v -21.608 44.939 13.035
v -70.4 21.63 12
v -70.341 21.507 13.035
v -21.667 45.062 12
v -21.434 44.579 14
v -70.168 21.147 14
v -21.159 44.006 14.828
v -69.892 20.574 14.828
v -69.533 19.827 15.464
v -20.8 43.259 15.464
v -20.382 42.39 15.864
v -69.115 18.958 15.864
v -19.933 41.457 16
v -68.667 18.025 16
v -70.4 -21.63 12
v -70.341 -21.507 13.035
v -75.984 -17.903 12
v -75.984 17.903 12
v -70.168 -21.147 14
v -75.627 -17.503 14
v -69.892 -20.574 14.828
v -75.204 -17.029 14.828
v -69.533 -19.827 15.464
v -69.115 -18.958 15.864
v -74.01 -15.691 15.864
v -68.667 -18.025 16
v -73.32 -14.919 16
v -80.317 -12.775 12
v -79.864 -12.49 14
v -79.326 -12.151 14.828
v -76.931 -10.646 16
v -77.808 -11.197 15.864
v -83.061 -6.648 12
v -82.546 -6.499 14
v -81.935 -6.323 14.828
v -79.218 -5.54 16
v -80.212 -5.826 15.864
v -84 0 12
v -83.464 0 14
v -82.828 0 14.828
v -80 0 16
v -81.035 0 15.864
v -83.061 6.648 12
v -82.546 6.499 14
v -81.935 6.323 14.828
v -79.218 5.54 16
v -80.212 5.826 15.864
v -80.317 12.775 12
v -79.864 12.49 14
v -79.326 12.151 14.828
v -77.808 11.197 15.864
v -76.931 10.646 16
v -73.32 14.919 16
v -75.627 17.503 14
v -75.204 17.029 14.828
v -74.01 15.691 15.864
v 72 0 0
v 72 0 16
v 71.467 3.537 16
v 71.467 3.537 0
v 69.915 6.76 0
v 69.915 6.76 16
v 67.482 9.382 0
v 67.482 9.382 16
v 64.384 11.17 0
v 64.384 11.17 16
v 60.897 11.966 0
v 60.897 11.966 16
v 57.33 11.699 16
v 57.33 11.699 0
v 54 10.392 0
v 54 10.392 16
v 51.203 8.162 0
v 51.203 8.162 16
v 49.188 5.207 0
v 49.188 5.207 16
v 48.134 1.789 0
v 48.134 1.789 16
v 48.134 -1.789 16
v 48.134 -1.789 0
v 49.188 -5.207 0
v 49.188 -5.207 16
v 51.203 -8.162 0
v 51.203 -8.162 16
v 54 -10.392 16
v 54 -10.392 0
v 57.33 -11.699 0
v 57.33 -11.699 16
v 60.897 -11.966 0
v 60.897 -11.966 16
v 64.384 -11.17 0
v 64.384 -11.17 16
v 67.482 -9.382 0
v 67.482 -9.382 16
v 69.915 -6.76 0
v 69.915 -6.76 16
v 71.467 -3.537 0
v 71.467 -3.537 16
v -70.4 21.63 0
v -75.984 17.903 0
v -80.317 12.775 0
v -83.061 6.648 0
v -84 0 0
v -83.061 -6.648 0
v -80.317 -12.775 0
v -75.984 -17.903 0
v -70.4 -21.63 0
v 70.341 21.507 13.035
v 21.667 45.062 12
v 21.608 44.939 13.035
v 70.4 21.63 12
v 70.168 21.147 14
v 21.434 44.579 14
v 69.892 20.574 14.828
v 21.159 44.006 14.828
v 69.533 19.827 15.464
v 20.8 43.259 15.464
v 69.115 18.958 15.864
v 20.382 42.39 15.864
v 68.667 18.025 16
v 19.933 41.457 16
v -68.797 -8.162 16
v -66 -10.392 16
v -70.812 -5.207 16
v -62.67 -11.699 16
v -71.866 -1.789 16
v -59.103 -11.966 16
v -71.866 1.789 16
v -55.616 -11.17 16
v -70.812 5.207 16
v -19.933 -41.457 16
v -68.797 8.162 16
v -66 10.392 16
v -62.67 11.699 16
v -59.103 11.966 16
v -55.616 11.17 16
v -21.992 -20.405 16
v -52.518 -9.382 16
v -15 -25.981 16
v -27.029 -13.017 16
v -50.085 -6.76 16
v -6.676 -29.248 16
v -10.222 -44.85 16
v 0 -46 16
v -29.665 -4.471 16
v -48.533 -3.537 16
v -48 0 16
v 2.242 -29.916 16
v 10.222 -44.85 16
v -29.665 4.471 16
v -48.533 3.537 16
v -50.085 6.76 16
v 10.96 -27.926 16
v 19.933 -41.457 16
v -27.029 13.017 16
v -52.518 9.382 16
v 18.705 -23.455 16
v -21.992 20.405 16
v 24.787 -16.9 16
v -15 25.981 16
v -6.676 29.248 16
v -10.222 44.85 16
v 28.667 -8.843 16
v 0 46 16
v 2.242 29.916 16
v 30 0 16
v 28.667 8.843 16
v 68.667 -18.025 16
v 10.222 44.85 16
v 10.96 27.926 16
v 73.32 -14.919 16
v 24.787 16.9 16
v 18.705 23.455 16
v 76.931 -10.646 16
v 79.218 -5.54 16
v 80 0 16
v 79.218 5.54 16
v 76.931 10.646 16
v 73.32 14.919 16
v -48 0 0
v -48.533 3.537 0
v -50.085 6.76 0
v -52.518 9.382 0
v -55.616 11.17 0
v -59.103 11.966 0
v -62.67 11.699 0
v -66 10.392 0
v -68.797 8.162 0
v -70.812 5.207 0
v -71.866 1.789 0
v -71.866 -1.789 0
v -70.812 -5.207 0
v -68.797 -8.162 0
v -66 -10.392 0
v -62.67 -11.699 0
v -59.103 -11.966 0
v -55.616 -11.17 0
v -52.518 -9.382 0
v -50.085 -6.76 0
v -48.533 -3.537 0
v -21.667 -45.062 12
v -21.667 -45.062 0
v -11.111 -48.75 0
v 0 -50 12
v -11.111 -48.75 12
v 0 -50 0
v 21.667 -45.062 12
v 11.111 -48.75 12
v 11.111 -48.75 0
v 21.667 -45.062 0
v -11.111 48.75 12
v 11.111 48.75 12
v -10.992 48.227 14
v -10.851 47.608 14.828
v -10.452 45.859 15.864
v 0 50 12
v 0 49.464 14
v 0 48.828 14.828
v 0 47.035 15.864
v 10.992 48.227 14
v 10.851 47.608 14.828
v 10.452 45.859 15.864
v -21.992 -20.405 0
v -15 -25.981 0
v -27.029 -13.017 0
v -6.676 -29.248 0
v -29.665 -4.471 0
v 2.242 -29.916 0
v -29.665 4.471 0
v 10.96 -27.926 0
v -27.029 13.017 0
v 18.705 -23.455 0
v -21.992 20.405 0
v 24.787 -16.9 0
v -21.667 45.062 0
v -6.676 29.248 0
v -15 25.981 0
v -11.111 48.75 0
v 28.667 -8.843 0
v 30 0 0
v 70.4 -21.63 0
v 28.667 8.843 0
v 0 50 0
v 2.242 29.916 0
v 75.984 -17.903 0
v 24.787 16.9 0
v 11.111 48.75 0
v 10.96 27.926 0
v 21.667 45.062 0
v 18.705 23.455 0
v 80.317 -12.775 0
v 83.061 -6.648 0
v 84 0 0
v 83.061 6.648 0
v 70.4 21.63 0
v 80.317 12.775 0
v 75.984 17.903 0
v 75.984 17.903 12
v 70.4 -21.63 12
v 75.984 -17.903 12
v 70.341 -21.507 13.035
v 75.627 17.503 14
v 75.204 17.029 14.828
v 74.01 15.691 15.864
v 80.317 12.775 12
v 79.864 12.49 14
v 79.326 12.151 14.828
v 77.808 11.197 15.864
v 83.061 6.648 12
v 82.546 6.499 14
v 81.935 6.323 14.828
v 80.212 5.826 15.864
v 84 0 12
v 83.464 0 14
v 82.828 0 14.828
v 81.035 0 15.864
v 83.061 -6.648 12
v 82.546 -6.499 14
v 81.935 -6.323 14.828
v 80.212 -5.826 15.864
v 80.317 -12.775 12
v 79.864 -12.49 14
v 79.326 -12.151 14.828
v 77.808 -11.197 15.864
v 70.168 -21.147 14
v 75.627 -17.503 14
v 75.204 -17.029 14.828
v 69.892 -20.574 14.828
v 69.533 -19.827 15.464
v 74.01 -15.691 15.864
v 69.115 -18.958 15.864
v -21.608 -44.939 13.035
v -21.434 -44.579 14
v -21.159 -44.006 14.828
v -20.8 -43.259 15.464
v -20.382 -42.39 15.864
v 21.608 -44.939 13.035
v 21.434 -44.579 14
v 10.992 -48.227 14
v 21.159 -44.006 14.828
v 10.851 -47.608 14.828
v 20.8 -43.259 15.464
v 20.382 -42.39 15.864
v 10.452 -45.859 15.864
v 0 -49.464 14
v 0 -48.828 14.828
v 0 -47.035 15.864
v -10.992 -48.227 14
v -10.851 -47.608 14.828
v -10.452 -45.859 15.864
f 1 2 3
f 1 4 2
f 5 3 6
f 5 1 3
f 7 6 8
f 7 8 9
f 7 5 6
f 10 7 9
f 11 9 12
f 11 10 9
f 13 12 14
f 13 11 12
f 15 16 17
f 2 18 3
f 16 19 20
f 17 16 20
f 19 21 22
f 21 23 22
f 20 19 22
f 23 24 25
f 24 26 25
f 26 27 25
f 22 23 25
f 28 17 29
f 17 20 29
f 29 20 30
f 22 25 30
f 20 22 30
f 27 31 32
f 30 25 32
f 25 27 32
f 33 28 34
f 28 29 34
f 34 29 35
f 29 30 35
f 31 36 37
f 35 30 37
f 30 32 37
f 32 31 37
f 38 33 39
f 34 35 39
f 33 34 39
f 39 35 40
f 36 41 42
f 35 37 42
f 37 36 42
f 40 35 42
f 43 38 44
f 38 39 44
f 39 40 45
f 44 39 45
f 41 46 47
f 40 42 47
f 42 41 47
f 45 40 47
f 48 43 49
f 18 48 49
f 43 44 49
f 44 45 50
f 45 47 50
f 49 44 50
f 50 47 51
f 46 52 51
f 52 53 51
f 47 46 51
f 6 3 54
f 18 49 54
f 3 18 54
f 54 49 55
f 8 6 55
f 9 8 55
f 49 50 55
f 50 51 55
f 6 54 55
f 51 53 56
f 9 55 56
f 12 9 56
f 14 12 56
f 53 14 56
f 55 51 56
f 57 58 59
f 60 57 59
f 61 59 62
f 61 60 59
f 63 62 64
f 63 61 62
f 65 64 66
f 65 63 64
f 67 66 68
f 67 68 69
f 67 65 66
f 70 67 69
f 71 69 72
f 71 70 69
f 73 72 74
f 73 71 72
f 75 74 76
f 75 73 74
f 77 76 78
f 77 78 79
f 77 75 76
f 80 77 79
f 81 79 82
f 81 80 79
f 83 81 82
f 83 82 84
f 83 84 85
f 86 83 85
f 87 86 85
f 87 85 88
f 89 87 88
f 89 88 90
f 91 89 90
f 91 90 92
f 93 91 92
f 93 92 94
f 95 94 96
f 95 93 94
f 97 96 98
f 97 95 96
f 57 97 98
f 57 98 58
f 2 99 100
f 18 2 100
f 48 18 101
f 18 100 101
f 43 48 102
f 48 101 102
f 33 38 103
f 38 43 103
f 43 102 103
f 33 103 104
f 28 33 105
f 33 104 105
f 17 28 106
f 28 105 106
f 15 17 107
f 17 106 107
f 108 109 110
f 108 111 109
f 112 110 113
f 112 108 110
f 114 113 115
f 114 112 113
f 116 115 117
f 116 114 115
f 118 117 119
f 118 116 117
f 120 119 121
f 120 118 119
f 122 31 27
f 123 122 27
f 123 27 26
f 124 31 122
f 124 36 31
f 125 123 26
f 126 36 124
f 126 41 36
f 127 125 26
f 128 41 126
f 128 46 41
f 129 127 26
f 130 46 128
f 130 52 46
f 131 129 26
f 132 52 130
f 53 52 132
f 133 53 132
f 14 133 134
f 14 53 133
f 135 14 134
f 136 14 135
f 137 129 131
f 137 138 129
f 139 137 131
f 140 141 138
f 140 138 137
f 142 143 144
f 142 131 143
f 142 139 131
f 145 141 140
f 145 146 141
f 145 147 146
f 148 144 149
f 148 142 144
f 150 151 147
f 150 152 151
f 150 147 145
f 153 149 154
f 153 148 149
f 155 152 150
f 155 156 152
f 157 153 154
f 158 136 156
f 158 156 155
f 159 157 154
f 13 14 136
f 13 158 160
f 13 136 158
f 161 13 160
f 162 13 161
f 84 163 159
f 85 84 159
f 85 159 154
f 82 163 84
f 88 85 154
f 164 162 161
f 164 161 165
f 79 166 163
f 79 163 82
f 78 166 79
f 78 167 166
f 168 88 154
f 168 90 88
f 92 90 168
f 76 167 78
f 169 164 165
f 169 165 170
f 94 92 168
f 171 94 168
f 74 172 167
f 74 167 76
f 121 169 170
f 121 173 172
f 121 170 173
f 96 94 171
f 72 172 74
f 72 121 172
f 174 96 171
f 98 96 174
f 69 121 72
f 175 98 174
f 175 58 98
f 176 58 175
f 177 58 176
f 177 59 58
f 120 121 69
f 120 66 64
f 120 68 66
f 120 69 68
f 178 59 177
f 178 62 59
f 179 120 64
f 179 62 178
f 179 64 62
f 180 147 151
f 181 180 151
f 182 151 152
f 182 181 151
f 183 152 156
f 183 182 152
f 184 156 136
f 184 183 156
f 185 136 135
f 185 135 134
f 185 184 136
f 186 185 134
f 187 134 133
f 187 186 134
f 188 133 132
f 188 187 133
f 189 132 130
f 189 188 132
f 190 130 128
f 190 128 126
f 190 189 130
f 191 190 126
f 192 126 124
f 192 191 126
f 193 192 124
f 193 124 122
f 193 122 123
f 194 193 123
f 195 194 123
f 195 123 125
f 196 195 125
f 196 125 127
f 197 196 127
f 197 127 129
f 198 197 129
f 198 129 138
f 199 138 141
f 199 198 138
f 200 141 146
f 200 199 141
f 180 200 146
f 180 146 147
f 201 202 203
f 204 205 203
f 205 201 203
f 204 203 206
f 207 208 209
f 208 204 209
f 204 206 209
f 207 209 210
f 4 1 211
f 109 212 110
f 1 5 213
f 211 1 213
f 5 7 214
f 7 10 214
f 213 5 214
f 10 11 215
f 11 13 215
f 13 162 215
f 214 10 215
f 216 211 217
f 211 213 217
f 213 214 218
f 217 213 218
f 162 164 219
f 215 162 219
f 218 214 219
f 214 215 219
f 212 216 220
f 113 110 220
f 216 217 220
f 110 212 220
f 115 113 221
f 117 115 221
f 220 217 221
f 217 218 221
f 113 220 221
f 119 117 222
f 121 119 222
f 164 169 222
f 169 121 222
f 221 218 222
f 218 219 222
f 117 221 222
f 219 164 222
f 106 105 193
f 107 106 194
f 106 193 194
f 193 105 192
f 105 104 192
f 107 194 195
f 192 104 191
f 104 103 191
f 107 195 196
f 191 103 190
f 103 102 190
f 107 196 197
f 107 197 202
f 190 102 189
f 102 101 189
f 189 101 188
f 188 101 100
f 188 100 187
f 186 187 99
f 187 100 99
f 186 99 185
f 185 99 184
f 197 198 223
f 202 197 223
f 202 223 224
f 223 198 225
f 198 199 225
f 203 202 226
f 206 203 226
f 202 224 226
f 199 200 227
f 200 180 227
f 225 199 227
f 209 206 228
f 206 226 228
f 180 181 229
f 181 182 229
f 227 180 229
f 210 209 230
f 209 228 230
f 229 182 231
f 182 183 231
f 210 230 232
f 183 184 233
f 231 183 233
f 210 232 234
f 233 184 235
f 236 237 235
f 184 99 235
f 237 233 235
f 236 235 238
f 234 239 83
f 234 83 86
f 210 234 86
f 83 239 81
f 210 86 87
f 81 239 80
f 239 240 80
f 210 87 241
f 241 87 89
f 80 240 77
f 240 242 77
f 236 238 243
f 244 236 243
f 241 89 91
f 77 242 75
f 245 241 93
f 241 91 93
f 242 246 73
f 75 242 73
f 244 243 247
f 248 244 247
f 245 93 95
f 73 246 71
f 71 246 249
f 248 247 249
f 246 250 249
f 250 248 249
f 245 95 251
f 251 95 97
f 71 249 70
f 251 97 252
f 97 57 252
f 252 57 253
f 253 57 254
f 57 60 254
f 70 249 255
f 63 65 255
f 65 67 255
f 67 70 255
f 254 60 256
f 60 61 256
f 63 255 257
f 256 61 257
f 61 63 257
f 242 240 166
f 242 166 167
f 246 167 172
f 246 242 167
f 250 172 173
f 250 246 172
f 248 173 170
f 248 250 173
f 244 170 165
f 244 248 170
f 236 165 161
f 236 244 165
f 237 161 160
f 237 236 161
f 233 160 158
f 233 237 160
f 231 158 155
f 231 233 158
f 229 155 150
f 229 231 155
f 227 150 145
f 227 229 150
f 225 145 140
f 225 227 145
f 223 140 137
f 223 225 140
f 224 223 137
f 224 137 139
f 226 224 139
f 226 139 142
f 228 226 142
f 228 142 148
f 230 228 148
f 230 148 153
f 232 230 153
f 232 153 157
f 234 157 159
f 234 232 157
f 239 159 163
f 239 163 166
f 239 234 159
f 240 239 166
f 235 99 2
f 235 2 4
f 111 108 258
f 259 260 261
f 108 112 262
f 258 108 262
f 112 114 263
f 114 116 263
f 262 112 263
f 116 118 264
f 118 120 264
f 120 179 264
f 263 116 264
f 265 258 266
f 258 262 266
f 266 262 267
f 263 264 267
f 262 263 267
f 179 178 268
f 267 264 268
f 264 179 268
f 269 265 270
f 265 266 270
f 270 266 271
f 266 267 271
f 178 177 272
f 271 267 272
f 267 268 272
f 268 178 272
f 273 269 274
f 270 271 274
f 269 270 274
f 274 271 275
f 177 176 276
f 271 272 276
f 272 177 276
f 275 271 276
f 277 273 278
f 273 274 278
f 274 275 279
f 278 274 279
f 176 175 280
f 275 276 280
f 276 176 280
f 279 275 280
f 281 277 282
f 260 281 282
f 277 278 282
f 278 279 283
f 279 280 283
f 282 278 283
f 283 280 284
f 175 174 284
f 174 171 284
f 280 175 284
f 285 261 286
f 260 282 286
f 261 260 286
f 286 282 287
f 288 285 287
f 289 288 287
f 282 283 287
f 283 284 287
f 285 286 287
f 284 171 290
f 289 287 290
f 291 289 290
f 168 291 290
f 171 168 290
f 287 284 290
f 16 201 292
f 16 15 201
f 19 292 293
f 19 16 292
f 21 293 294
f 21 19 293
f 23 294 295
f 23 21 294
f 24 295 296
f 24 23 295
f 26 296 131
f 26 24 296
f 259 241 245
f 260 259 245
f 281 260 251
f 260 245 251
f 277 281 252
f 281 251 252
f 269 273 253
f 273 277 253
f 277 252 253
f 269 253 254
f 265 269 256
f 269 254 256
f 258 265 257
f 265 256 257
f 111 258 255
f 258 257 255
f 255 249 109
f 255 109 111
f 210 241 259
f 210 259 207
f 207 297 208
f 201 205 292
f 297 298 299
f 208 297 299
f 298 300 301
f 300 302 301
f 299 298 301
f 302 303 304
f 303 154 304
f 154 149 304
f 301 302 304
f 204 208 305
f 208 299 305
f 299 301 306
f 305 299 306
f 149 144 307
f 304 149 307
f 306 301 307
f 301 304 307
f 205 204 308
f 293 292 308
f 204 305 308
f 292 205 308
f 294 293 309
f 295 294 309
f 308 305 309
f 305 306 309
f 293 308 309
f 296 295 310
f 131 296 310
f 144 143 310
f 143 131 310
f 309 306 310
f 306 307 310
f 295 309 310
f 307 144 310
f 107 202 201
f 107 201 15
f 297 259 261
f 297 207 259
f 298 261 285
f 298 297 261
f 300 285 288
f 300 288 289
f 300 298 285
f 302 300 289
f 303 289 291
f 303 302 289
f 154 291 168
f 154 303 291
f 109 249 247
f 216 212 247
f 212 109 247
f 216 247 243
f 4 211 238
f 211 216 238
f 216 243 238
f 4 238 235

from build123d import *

# Parameters (mm, degrees)
SKETCH_R   = 30
SKETCH_R_2 = 12
PAD_DEPTH  = 16
FILLET_R   = 4


with BuildPart() as part:
    # Sketch → Pad (new body)
    with BuildSketch(Plane.XY):
        with BuildLine():
            ThreePointArc((70.4, -21.629609), (84, 0), (70.4, 21.629609))
            Line((21.666667, 45.061686), (70.4, 21.629609))
            ThreePointArc((21.666667, 45.061686), (0, 50), (-21.666667, 45.061686))
            Line((-70.4, 21.629609), (-21.666667, 45.061686))
            ThreePointArc((-70.4, 21.629609), (-84, 0), (-70.4, -21.629609))
            Line((-21.666667, -45.061686), (-70.4, -21.629609))
            ThreePointArc((-21.666667, -45.061686), (0, -50), (21.666667, -45.061686))
            Line((70.4, -21.629609), (21.666667, -45.061686))
        make_face()
        Circle(SKETCH_R, mode=Mode.SUBTRACT)
        with Locations((60, 0)):
            Circle(SKETCH_R_2, mode=Mode.SUBTRACT)
        with Locations((-60, 0)):
            Circle(SKETCH_R_2, mode=Mode.SUBTRACT)
    extrude(amount=PAD_DEPTH)

    # Fillet
    fillet_edges = [part.edges().sort_by_distance(p)[0] for p in [
        (-46.033333, -33.345648, 16),
        (0, -50, 16),
        (46.033333, -33.345648, 16),
        (84, 0, 16),
        (46.033333, 33.345648, 16),
        (0, 50, 16),
        (-46.033333, 33.345648, 16),
        (-84, 0, 16),
    ]]
    fillet(fillet_edges, radius=FILLET_R)


solid = part.part
